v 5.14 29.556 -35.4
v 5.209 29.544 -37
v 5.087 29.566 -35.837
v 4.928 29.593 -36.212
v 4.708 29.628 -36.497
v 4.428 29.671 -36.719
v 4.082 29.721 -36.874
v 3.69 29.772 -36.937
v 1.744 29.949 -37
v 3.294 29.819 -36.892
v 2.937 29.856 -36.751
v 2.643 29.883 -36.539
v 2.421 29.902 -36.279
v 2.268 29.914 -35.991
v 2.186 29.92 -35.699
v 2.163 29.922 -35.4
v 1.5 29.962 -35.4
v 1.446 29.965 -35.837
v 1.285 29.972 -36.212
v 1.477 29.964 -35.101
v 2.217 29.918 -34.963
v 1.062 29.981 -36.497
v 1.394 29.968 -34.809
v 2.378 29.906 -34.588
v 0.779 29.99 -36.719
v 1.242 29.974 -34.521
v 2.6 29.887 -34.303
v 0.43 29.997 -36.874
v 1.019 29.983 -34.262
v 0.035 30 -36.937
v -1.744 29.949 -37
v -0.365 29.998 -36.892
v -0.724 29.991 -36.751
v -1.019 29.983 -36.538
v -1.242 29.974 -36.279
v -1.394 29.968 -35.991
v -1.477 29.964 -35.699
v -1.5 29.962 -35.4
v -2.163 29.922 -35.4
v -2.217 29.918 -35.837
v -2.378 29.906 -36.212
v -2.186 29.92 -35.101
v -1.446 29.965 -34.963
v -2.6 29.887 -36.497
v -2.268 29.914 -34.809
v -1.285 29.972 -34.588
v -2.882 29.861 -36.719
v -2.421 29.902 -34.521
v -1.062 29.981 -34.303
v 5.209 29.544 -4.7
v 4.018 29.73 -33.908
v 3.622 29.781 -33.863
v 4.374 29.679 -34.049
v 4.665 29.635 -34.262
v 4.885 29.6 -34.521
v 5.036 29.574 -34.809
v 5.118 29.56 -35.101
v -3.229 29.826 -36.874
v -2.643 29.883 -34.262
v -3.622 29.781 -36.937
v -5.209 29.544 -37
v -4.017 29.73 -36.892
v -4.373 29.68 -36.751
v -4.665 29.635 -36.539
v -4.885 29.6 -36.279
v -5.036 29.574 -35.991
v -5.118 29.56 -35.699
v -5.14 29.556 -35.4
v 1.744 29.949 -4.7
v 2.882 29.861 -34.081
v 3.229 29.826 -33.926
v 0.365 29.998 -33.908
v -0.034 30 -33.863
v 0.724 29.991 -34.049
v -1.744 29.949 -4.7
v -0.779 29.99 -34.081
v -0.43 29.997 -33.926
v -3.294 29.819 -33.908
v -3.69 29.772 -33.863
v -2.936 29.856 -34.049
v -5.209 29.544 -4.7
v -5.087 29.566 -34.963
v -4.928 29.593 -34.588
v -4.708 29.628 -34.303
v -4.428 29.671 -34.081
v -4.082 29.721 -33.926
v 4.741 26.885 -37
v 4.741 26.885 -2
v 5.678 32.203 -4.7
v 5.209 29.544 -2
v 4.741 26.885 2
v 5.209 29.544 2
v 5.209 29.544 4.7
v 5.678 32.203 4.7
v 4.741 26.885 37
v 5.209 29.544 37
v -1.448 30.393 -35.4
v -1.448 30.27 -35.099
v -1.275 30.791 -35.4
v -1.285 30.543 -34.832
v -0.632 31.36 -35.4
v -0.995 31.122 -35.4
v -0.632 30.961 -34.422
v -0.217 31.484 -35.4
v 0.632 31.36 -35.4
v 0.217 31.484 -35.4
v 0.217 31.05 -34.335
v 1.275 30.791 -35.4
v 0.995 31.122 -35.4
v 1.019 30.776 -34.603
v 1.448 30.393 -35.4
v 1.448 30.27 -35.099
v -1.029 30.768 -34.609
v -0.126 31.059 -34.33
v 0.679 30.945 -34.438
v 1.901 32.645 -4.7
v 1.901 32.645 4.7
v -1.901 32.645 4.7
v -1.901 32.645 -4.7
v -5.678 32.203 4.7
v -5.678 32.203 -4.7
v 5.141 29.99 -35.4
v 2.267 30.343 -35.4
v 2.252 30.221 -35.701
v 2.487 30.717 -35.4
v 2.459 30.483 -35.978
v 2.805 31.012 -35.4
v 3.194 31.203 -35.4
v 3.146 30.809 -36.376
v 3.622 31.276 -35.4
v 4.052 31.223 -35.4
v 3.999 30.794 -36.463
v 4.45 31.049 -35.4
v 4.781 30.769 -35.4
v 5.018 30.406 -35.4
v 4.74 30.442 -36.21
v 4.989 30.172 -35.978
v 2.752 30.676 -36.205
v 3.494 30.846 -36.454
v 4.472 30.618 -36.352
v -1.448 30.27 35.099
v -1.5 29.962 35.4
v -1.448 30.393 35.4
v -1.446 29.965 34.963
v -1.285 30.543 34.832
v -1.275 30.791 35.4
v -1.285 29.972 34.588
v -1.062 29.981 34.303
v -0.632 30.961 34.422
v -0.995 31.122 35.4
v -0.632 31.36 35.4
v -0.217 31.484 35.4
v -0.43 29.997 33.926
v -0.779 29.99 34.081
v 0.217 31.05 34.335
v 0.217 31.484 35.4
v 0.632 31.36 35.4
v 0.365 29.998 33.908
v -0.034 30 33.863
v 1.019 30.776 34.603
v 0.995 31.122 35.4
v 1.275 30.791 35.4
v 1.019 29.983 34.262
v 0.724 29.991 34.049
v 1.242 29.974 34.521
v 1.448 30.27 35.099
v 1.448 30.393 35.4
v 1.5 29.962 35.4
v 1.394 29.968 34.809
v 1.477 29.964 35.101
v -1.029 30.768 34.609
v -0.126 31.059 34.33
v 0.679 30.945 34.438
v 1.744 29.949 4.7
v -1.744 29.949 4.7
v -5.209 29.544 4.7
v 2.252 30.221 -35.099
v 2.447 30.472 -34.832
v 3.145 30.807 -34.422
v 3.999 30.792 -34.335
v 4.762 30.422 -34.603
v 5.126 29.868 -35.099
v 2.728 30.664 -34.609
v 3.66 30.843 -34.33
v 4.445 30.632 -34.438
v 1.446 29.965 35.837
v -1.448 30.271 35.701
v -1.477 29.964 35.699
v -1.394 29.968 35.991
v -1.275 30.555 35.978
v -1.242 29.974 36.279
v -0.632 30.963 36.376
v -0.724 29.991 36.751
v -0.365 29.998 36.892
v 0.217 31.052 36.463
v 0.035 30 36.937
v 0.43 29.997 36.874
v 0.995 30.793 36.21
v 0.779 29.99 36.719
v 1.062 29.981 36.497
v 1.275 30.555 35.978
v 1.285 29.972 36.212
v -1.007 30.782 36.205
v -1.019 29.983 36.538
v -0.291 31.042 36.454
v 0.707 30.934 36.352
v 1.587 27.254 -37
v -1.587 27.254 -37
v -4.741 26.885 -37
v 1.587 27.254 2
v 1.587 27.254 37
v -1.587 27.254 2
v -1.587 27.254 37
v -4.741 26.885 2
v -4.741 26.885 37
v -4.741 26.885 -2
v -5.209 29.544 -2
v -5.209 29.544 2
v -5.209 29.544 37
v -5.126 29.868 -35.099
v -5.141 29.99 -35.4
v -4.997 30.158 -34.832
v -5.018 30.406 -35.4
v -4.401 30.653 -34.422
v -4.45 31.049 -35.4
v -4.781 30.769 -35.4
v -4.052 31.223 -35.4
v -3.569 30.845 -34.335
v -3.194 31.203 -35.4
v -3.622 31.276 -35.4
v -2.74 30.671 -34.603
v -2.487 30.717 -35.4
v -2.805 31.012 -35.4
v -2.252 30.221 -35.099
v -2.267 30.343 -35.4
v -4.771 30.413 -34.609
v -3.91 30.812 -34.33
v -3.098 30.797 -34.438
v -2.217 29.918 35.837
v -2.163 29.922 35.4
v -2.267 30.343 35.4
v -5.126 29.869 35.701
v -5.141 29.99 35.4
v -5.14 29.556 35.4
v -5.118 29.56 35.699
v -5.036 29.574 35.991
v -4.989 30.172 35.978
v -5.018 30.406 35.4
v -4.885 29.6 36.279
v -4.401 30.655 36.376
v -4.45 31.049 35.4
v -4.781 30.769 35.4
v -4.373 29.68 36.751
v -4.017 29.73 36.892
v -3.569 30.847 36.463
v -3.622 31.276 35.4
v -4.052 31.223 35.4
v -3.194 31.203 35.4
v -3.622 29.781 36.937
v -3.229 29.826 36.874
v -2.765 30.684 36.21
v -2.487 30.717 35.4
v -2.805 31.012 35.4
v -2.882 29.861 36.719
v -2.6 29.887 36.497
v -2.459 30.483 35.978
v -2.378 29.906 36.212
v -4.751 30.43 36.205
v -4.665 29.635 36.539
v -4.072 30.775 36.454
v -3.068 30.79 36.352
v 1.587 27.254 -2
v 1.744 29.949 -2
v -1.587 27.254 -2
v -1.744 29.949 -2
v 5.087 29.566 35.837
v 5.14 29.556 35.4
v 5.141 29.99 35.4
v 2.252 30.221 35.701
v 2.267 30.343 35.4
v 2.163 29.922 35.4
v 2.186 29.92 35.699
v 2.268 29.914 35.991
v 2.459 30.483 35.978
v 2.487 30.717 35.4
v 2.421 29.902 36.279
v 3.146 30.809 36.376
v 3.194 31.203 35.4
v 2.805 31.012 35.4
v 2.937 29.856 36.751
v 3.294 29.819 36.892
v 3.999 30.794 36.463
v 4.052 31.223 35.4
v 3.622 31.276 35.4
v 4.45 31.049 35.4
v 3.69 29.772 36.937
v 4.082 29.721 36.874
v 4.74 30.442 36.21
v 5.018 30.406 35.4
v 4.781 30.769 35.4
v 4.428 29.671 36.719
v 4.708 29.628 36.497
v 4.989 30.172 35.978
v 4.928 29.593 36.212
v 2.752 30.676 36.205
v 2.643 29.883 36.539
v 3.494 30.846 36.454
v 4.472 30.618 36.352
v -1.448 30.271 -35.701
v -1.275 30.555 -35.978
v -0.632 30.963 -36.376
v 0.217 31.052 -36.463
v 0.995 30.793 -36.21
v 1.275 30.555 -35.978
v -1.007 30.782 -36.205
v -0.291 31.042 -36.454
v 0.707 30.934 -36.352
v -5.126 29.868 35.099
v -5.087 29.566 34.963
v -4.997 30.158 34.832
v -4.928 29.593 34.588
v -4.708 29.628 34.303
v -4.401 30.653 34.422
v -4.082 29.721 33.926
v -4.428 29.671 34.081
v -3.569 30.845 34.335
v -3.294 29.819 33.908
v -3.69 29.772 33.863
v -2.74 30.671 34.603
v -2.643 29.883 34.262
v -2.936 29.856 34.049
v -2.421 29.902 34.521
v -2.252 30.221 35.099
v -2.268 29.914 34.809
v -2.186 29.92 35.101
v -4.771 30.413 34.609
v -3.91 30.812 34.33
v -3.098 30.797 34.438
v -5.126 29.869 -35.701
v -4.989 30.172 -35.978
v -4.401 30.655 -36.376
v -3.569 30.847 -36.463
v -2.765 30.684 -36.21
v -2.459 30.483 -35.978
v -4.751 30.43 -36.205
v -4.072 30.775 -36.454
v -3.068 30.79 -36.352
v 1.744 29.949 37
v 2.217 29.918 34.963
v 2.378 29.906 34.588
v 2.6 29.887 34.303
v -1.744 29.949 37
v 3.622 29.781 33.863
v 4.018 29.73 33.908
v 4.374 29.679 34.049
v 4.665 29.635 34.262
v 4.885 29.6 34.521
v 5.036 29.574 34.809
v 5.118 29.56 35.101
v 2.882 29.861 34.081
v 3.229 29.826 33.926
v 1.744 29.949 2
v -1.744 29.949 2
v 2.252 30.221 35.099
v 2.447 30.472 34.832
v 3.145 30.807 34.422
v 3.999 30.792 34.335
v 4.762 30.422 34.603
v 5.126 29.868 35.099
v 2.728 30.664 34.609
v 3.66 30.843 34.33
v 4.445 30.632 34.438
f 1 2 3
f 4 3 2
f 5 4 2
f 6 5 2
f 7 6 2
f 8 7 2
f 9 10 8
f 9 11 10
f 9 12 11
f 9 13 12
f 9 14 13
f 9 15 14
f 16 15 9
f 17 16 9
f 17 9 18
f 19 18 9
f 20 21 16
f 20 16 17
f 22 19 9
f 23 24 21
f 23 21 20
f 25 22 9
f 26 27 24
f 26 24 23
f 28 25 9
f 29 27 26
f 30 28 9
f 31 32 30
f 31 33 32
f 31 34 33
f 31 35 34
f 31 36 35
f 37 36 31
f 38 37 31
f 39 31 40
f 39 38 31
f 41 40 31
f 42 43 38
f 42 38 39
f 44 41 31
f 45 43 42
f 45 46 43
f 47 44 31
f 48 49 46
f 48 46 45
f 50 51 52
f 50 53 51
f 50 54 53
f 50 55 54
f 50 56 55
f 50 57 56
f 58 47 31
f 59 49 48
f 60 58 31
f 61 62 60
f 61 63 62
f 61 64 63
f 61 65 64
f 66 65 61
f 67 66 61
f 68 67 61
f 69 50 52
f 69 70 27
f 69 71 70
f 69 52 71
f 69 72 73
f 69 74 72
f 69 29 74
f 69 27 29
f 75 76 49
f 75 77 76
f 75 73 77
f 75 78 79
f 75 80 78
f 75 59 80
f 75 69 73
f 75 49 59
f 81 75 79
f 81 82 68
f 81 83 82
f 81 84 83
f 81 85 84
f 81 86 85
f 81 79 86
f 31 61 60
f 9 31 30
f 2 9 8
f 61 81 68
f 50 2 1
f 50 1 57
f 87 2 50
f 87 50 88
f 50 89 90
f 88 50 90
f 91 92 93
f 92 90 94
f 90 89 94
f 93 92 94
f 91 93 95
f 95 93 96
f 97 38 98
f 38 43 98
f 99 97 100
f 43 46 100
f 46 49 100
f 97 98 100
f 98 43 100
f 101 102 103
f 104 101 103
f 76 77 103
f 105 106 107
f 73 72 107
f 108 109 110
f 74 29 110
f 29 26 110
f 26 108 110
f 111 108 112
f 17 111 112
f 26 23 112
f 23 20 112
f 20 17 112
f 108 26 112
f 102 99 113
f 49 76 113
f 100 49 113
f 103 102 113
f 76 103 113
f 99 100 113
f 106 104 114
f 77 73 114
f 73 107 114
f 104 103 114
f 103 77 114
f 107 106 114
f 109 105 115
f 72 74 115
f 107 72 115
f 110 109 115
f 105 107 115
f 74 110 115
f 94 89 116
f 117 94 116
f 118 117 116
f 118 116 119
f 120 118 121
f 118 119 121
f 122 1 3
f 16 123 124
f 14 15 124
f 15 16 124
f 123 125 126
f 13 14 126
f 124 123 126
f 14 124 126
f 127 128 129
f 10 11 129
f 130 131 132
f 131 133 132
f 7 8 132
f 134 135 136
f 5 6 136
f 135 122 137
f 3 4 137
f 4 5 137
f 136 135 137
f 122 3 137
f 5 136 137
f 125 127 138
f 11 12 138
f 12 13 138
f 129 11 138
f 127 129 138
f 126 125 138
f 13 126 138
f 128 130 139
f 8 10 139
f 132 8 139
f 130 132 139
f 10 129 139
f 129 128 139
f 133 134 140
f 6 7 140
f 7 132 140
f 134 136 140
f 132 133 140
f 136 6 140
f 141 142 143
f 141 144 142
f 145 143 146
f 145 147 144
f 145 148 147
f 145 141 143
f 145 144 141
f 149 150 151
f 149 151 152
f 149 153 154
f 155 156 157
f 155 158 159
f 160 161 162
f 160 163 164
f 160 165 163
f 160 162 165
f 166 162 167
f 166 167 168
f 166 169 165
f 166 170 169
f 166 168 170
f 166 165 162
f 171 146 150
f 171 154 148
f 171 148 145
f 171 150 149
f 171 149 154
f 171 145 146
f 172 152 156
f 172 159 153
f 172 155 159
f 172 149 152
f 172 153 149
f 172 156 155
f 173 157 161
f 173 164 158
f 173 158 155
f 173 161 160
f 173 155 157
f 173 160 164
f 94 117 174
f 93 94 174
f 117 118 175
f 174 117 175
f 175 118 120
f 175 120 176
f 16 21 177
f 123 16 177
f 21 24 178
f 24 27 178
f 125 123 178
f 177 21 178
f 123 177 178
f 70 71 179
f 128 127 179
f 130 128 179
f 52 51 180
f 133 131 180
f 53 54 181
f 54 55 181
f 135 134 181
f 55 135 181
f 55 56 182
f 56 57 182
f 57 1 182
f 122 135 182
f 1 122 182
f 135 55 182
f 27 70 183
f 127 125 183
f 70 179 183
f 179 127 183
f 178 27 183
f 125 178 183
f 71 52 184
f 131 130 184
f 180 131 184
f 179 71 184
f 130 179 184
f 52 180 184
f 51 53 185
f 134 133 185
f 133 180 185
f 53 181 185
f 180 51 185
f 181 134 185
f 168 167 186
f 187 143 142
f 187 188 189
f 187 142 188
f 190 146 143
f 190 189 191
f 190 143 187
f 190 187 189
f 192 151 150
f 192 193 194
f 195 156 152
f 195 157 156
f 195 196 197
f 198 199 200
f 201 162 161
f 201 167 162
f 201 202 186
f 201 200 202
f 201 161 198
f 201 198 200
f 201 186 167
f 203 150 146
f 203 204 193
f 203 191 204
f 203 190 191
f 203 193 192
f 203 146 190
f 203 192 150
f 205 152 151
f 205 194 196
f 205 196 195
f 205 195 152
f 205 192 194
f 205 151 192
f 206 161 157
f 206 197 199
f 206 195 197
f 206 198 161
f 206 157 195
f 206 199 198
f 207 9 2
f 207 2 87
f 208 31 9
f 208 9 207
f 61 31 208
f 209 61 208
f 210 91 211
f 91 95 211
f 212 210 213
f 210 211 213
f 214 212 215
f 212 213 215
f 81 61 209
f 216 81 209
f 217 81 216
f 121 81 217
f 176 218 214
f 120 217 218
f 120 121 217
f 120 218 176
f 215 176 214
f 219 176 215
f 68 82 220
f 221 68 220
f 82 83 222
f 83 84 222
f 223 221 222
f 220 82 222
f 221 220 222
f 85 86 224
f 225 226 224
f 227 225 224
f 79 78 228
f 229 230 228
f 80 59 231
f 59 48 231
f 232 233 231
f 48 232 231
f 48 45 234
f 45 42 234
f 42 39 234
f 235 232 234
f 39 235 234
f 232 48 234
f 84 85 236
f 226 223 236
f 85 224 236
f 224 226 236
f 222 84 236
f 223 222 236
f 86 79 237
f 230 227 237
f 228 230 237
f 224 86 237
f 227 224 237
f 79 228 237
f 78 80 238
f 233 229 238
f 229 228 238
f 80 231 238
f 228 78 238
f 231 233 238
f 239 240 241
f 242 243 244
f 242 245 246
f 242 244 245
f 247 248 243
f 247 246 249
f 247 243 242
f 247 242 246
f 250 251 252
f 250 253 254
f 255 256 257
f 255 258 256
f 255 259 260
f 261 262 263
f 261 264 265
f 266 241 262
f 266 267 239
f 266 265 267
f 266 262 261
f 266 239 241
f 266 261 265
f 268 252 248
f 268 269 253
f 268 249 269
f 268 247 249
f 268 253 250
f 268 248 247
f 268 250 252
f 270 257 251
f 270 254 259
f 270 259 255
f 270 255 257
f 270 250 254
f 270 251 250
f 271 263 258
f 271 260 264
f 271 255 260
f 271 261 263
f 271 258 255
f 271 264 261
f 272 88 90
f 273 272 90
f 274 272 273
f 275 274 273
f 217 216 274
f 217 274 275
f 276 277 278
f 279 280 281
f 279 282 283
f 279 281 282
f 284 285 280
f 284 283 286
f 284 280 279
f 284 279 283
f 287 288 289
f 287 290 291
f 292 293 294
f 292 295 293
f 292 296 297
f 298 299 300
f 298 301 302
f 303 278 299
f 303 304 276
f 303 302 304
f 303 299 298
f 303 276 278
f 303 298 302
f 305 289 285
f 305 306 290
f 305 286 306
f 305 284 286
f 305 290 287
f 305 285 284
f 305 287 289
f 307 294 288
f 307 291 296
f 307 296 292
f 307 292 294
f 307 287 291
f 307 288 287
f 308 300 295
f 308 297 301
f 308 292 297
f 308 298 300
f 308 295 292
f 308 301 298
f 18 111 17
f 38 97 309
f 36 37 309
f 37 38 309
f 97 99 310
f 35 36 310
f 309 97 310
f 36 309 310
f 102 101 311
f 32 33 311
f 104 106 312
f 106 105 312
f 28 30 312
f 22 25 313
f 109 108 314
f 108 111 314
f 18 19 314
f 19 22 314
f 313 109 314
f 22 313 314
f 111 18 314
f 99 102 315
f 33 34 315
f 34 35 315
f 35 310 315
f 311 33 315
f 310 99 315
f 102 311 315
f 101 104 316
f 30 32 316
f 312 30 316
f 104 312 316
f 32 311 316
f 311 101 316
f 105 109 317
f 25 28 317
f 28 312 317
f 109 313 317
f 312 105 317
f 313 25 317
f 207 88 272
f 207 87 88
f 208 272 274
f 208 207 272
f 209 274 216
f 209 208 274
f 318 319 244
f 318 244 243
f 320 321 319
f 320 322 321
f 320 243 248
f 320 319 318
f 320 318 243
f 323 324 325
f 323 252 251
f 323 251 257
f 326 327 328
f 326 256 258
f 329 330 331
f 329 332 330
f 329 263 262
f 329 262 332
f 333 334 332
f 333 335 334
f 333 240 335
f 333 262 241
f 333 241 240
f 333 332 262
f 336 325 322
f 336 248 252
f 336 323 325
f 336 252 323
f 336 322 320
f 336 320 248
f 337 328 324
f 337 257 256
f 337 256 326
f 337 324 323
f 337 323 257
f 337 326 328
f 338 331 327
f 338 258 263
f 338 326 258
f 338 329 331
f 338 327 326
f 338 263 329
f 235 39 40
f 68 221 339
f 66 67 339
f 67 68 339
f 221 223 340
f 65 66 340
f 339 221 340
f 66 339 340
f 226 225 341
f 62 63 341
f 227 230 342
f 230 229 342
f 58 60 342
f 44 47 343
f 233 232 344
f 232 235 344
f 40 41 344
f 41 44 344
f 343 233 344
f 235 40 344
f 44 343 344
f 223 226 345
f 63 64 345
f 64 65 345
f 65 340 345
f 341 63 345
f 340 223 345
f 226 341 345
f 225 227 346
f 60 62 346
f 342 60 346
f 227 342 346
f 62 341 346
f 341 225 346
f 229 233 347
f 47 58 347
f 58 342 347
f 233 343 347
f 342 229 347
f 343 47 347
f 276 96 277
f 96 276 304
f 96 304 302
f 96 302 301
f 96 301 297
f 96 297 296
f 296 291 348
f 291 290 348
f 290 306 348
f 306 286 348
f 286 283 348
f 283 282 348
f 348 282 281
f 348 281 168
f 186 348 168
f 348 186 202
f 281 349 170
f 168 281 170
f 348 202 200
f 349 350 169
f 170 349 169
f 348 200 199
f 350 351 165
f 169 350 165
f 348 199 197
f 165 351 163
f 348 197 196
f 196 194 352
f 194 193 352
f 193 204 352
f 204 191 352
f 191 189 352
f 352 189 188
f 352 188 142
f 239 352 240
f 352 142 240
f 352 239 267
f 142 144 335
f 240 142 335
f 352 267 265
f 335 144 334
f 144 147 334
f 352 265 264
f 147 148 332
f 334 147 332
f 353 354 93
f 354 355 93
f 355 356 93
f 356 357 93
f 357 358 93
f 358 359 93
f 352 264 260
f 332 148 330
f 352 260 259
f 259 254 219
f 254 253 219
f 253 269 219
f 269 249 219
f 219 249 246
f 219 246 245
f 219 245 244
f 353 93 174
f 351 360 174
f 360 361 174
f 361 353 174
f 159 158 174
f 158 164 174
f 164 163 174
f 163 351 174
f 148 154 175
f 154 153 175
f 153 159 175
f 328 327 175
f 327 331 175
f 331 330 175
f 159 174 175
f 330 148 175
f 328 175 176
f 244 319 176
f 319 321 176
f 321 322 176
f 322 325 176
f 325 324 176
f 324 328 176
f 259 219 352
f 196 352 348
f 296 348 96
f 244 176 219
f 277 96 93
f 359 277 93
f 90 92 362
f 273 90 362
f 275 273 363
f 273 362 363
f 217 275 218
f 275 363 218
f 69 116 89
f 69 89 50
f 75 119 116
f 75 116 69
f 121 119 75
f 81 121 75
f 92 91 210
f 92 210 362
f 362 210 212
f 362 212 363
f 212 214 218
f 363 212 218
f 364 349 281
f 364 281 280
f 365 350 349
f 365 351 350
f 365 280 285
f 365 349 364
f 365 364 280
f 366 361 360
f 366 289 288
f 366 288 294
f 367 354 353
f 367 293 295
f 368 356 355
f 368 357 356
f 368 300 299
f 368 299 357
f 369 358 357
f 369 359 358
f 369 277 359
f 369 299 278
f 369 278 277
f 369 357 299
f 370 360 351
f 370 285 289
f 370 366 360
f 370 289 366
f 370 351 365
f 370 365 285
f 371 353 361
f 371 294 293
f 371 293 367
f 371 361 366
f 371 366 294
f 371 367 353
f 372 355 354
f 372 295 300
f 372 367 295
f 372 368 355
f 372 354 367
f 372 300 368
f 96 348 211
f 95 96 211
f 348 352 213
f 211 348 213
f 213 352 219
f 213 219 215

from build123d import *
from build123d.topology import SkipClean

# Parameters (mm, degrees)
REVOLVE1_ANGLE                  = 20
CIRPATTERN1_COUNT               = 2
CIRPATTERN1_ANGLE               = 7
CIRPATTERN1_THE_OTHER_WAY_COUNT = 2
CIRPATTERN1_THE_OTHER_WAY_ANGLE = 7


with BuildPart() as part:
    # Sketch2 → Revolve1 (revolve, symmetric)
    with BuildSketch(Plane(origin=(0, 0, 0), x_dir=(0, 0, -1), z_dir=(1, 0, 0))) as revolve1_sk:
        Polygon((0, 30), (2, 30), (2, 27.3), (37, 27.3), (37, 30), (4.7, 30), (4.7, 32.7), (0, 32.7), align=None)
    revolve(axis=Axis((0, 0, 0), (0, 0, -1)), revolution_arc=REVOLVE1_ANGLE / 2)
    revolve(revolve1_sk.sketch, axis=Axis((0, 0, 0), (0, 0, 1)), revolution_arc=REVOLVE1_ANGLE / 2)

    # Sketch3 → Revolve2 (revolve)
    with SkipClean():  # the faces are left unmerged after this step: merging them gives an invalid solid
        with BuildSketch(Plane(origin=(0, 0, -35.4), x_dir=(-1, 0, 0), z_dir=(0, 0, -1))):
            with BuildLine():
                Line((-1.499531177, 29.9625), (1.499531177, 29.9625))
                ThreePointArc((1.499531177, 29.9625), (0, 31.5), (-1.499531177, 29.9625))
            make_face()
        revolve2 = revolve(axis=Axis((1.499531177, 29.9625, -35.4), (-1, 0, 0)))
    add(part.part.scale(1), mode=Mode.REPLACE)  # the faces are merged on a copy

    # CirPattern1: Revolve2 ×2 about axis
    with SkipClean():  # the faces are left unmerged after this step: merging them gives an invalid solid
        cirpattern1_axis = Axis((0, 0, 0), (0, 0, -1))
        for i in range(1, CIRPATTERN1_COUNT):
            add(revolve2.rotate(cirpattern1_axis, i * CIRPATTERN1_ANGLE / (CIRPATTERN1_COUNT - 1)))
    add(part.part.scale(1), mode=Mode.REPLACE)  # the faces are merged on a copy

    # CirPattern1 the other way: Revolve2 ×2 about axis
    with SkipClean():  # the faces are left unmerged after this step: merging them gives an invalid solid
        cirpattern1_the_other_way_axis = Axis((0, 0, 0), (0, 0, 1))
        for i in range(1, CIRPATTERN1_THE_OTHER_WAY_COUNT):
            add(revolve2.rotate(cirpattern1_the_other_way_axis, i * CIRPATTERN1_THE_OTHER_WAY_ANGLE / (CIRPATTERN1_THE_OTHER_WAY_COUNT - 1)))
    add(part.part.scale(1), mode=Mode.REPLACE)  # the faces are merged on a copy

    # Mirror2: part across plane


with BuildPart() as part_1:
    add(part.part)
    add(part.part.mirror(Plane.XY))


solid = part_1.part
